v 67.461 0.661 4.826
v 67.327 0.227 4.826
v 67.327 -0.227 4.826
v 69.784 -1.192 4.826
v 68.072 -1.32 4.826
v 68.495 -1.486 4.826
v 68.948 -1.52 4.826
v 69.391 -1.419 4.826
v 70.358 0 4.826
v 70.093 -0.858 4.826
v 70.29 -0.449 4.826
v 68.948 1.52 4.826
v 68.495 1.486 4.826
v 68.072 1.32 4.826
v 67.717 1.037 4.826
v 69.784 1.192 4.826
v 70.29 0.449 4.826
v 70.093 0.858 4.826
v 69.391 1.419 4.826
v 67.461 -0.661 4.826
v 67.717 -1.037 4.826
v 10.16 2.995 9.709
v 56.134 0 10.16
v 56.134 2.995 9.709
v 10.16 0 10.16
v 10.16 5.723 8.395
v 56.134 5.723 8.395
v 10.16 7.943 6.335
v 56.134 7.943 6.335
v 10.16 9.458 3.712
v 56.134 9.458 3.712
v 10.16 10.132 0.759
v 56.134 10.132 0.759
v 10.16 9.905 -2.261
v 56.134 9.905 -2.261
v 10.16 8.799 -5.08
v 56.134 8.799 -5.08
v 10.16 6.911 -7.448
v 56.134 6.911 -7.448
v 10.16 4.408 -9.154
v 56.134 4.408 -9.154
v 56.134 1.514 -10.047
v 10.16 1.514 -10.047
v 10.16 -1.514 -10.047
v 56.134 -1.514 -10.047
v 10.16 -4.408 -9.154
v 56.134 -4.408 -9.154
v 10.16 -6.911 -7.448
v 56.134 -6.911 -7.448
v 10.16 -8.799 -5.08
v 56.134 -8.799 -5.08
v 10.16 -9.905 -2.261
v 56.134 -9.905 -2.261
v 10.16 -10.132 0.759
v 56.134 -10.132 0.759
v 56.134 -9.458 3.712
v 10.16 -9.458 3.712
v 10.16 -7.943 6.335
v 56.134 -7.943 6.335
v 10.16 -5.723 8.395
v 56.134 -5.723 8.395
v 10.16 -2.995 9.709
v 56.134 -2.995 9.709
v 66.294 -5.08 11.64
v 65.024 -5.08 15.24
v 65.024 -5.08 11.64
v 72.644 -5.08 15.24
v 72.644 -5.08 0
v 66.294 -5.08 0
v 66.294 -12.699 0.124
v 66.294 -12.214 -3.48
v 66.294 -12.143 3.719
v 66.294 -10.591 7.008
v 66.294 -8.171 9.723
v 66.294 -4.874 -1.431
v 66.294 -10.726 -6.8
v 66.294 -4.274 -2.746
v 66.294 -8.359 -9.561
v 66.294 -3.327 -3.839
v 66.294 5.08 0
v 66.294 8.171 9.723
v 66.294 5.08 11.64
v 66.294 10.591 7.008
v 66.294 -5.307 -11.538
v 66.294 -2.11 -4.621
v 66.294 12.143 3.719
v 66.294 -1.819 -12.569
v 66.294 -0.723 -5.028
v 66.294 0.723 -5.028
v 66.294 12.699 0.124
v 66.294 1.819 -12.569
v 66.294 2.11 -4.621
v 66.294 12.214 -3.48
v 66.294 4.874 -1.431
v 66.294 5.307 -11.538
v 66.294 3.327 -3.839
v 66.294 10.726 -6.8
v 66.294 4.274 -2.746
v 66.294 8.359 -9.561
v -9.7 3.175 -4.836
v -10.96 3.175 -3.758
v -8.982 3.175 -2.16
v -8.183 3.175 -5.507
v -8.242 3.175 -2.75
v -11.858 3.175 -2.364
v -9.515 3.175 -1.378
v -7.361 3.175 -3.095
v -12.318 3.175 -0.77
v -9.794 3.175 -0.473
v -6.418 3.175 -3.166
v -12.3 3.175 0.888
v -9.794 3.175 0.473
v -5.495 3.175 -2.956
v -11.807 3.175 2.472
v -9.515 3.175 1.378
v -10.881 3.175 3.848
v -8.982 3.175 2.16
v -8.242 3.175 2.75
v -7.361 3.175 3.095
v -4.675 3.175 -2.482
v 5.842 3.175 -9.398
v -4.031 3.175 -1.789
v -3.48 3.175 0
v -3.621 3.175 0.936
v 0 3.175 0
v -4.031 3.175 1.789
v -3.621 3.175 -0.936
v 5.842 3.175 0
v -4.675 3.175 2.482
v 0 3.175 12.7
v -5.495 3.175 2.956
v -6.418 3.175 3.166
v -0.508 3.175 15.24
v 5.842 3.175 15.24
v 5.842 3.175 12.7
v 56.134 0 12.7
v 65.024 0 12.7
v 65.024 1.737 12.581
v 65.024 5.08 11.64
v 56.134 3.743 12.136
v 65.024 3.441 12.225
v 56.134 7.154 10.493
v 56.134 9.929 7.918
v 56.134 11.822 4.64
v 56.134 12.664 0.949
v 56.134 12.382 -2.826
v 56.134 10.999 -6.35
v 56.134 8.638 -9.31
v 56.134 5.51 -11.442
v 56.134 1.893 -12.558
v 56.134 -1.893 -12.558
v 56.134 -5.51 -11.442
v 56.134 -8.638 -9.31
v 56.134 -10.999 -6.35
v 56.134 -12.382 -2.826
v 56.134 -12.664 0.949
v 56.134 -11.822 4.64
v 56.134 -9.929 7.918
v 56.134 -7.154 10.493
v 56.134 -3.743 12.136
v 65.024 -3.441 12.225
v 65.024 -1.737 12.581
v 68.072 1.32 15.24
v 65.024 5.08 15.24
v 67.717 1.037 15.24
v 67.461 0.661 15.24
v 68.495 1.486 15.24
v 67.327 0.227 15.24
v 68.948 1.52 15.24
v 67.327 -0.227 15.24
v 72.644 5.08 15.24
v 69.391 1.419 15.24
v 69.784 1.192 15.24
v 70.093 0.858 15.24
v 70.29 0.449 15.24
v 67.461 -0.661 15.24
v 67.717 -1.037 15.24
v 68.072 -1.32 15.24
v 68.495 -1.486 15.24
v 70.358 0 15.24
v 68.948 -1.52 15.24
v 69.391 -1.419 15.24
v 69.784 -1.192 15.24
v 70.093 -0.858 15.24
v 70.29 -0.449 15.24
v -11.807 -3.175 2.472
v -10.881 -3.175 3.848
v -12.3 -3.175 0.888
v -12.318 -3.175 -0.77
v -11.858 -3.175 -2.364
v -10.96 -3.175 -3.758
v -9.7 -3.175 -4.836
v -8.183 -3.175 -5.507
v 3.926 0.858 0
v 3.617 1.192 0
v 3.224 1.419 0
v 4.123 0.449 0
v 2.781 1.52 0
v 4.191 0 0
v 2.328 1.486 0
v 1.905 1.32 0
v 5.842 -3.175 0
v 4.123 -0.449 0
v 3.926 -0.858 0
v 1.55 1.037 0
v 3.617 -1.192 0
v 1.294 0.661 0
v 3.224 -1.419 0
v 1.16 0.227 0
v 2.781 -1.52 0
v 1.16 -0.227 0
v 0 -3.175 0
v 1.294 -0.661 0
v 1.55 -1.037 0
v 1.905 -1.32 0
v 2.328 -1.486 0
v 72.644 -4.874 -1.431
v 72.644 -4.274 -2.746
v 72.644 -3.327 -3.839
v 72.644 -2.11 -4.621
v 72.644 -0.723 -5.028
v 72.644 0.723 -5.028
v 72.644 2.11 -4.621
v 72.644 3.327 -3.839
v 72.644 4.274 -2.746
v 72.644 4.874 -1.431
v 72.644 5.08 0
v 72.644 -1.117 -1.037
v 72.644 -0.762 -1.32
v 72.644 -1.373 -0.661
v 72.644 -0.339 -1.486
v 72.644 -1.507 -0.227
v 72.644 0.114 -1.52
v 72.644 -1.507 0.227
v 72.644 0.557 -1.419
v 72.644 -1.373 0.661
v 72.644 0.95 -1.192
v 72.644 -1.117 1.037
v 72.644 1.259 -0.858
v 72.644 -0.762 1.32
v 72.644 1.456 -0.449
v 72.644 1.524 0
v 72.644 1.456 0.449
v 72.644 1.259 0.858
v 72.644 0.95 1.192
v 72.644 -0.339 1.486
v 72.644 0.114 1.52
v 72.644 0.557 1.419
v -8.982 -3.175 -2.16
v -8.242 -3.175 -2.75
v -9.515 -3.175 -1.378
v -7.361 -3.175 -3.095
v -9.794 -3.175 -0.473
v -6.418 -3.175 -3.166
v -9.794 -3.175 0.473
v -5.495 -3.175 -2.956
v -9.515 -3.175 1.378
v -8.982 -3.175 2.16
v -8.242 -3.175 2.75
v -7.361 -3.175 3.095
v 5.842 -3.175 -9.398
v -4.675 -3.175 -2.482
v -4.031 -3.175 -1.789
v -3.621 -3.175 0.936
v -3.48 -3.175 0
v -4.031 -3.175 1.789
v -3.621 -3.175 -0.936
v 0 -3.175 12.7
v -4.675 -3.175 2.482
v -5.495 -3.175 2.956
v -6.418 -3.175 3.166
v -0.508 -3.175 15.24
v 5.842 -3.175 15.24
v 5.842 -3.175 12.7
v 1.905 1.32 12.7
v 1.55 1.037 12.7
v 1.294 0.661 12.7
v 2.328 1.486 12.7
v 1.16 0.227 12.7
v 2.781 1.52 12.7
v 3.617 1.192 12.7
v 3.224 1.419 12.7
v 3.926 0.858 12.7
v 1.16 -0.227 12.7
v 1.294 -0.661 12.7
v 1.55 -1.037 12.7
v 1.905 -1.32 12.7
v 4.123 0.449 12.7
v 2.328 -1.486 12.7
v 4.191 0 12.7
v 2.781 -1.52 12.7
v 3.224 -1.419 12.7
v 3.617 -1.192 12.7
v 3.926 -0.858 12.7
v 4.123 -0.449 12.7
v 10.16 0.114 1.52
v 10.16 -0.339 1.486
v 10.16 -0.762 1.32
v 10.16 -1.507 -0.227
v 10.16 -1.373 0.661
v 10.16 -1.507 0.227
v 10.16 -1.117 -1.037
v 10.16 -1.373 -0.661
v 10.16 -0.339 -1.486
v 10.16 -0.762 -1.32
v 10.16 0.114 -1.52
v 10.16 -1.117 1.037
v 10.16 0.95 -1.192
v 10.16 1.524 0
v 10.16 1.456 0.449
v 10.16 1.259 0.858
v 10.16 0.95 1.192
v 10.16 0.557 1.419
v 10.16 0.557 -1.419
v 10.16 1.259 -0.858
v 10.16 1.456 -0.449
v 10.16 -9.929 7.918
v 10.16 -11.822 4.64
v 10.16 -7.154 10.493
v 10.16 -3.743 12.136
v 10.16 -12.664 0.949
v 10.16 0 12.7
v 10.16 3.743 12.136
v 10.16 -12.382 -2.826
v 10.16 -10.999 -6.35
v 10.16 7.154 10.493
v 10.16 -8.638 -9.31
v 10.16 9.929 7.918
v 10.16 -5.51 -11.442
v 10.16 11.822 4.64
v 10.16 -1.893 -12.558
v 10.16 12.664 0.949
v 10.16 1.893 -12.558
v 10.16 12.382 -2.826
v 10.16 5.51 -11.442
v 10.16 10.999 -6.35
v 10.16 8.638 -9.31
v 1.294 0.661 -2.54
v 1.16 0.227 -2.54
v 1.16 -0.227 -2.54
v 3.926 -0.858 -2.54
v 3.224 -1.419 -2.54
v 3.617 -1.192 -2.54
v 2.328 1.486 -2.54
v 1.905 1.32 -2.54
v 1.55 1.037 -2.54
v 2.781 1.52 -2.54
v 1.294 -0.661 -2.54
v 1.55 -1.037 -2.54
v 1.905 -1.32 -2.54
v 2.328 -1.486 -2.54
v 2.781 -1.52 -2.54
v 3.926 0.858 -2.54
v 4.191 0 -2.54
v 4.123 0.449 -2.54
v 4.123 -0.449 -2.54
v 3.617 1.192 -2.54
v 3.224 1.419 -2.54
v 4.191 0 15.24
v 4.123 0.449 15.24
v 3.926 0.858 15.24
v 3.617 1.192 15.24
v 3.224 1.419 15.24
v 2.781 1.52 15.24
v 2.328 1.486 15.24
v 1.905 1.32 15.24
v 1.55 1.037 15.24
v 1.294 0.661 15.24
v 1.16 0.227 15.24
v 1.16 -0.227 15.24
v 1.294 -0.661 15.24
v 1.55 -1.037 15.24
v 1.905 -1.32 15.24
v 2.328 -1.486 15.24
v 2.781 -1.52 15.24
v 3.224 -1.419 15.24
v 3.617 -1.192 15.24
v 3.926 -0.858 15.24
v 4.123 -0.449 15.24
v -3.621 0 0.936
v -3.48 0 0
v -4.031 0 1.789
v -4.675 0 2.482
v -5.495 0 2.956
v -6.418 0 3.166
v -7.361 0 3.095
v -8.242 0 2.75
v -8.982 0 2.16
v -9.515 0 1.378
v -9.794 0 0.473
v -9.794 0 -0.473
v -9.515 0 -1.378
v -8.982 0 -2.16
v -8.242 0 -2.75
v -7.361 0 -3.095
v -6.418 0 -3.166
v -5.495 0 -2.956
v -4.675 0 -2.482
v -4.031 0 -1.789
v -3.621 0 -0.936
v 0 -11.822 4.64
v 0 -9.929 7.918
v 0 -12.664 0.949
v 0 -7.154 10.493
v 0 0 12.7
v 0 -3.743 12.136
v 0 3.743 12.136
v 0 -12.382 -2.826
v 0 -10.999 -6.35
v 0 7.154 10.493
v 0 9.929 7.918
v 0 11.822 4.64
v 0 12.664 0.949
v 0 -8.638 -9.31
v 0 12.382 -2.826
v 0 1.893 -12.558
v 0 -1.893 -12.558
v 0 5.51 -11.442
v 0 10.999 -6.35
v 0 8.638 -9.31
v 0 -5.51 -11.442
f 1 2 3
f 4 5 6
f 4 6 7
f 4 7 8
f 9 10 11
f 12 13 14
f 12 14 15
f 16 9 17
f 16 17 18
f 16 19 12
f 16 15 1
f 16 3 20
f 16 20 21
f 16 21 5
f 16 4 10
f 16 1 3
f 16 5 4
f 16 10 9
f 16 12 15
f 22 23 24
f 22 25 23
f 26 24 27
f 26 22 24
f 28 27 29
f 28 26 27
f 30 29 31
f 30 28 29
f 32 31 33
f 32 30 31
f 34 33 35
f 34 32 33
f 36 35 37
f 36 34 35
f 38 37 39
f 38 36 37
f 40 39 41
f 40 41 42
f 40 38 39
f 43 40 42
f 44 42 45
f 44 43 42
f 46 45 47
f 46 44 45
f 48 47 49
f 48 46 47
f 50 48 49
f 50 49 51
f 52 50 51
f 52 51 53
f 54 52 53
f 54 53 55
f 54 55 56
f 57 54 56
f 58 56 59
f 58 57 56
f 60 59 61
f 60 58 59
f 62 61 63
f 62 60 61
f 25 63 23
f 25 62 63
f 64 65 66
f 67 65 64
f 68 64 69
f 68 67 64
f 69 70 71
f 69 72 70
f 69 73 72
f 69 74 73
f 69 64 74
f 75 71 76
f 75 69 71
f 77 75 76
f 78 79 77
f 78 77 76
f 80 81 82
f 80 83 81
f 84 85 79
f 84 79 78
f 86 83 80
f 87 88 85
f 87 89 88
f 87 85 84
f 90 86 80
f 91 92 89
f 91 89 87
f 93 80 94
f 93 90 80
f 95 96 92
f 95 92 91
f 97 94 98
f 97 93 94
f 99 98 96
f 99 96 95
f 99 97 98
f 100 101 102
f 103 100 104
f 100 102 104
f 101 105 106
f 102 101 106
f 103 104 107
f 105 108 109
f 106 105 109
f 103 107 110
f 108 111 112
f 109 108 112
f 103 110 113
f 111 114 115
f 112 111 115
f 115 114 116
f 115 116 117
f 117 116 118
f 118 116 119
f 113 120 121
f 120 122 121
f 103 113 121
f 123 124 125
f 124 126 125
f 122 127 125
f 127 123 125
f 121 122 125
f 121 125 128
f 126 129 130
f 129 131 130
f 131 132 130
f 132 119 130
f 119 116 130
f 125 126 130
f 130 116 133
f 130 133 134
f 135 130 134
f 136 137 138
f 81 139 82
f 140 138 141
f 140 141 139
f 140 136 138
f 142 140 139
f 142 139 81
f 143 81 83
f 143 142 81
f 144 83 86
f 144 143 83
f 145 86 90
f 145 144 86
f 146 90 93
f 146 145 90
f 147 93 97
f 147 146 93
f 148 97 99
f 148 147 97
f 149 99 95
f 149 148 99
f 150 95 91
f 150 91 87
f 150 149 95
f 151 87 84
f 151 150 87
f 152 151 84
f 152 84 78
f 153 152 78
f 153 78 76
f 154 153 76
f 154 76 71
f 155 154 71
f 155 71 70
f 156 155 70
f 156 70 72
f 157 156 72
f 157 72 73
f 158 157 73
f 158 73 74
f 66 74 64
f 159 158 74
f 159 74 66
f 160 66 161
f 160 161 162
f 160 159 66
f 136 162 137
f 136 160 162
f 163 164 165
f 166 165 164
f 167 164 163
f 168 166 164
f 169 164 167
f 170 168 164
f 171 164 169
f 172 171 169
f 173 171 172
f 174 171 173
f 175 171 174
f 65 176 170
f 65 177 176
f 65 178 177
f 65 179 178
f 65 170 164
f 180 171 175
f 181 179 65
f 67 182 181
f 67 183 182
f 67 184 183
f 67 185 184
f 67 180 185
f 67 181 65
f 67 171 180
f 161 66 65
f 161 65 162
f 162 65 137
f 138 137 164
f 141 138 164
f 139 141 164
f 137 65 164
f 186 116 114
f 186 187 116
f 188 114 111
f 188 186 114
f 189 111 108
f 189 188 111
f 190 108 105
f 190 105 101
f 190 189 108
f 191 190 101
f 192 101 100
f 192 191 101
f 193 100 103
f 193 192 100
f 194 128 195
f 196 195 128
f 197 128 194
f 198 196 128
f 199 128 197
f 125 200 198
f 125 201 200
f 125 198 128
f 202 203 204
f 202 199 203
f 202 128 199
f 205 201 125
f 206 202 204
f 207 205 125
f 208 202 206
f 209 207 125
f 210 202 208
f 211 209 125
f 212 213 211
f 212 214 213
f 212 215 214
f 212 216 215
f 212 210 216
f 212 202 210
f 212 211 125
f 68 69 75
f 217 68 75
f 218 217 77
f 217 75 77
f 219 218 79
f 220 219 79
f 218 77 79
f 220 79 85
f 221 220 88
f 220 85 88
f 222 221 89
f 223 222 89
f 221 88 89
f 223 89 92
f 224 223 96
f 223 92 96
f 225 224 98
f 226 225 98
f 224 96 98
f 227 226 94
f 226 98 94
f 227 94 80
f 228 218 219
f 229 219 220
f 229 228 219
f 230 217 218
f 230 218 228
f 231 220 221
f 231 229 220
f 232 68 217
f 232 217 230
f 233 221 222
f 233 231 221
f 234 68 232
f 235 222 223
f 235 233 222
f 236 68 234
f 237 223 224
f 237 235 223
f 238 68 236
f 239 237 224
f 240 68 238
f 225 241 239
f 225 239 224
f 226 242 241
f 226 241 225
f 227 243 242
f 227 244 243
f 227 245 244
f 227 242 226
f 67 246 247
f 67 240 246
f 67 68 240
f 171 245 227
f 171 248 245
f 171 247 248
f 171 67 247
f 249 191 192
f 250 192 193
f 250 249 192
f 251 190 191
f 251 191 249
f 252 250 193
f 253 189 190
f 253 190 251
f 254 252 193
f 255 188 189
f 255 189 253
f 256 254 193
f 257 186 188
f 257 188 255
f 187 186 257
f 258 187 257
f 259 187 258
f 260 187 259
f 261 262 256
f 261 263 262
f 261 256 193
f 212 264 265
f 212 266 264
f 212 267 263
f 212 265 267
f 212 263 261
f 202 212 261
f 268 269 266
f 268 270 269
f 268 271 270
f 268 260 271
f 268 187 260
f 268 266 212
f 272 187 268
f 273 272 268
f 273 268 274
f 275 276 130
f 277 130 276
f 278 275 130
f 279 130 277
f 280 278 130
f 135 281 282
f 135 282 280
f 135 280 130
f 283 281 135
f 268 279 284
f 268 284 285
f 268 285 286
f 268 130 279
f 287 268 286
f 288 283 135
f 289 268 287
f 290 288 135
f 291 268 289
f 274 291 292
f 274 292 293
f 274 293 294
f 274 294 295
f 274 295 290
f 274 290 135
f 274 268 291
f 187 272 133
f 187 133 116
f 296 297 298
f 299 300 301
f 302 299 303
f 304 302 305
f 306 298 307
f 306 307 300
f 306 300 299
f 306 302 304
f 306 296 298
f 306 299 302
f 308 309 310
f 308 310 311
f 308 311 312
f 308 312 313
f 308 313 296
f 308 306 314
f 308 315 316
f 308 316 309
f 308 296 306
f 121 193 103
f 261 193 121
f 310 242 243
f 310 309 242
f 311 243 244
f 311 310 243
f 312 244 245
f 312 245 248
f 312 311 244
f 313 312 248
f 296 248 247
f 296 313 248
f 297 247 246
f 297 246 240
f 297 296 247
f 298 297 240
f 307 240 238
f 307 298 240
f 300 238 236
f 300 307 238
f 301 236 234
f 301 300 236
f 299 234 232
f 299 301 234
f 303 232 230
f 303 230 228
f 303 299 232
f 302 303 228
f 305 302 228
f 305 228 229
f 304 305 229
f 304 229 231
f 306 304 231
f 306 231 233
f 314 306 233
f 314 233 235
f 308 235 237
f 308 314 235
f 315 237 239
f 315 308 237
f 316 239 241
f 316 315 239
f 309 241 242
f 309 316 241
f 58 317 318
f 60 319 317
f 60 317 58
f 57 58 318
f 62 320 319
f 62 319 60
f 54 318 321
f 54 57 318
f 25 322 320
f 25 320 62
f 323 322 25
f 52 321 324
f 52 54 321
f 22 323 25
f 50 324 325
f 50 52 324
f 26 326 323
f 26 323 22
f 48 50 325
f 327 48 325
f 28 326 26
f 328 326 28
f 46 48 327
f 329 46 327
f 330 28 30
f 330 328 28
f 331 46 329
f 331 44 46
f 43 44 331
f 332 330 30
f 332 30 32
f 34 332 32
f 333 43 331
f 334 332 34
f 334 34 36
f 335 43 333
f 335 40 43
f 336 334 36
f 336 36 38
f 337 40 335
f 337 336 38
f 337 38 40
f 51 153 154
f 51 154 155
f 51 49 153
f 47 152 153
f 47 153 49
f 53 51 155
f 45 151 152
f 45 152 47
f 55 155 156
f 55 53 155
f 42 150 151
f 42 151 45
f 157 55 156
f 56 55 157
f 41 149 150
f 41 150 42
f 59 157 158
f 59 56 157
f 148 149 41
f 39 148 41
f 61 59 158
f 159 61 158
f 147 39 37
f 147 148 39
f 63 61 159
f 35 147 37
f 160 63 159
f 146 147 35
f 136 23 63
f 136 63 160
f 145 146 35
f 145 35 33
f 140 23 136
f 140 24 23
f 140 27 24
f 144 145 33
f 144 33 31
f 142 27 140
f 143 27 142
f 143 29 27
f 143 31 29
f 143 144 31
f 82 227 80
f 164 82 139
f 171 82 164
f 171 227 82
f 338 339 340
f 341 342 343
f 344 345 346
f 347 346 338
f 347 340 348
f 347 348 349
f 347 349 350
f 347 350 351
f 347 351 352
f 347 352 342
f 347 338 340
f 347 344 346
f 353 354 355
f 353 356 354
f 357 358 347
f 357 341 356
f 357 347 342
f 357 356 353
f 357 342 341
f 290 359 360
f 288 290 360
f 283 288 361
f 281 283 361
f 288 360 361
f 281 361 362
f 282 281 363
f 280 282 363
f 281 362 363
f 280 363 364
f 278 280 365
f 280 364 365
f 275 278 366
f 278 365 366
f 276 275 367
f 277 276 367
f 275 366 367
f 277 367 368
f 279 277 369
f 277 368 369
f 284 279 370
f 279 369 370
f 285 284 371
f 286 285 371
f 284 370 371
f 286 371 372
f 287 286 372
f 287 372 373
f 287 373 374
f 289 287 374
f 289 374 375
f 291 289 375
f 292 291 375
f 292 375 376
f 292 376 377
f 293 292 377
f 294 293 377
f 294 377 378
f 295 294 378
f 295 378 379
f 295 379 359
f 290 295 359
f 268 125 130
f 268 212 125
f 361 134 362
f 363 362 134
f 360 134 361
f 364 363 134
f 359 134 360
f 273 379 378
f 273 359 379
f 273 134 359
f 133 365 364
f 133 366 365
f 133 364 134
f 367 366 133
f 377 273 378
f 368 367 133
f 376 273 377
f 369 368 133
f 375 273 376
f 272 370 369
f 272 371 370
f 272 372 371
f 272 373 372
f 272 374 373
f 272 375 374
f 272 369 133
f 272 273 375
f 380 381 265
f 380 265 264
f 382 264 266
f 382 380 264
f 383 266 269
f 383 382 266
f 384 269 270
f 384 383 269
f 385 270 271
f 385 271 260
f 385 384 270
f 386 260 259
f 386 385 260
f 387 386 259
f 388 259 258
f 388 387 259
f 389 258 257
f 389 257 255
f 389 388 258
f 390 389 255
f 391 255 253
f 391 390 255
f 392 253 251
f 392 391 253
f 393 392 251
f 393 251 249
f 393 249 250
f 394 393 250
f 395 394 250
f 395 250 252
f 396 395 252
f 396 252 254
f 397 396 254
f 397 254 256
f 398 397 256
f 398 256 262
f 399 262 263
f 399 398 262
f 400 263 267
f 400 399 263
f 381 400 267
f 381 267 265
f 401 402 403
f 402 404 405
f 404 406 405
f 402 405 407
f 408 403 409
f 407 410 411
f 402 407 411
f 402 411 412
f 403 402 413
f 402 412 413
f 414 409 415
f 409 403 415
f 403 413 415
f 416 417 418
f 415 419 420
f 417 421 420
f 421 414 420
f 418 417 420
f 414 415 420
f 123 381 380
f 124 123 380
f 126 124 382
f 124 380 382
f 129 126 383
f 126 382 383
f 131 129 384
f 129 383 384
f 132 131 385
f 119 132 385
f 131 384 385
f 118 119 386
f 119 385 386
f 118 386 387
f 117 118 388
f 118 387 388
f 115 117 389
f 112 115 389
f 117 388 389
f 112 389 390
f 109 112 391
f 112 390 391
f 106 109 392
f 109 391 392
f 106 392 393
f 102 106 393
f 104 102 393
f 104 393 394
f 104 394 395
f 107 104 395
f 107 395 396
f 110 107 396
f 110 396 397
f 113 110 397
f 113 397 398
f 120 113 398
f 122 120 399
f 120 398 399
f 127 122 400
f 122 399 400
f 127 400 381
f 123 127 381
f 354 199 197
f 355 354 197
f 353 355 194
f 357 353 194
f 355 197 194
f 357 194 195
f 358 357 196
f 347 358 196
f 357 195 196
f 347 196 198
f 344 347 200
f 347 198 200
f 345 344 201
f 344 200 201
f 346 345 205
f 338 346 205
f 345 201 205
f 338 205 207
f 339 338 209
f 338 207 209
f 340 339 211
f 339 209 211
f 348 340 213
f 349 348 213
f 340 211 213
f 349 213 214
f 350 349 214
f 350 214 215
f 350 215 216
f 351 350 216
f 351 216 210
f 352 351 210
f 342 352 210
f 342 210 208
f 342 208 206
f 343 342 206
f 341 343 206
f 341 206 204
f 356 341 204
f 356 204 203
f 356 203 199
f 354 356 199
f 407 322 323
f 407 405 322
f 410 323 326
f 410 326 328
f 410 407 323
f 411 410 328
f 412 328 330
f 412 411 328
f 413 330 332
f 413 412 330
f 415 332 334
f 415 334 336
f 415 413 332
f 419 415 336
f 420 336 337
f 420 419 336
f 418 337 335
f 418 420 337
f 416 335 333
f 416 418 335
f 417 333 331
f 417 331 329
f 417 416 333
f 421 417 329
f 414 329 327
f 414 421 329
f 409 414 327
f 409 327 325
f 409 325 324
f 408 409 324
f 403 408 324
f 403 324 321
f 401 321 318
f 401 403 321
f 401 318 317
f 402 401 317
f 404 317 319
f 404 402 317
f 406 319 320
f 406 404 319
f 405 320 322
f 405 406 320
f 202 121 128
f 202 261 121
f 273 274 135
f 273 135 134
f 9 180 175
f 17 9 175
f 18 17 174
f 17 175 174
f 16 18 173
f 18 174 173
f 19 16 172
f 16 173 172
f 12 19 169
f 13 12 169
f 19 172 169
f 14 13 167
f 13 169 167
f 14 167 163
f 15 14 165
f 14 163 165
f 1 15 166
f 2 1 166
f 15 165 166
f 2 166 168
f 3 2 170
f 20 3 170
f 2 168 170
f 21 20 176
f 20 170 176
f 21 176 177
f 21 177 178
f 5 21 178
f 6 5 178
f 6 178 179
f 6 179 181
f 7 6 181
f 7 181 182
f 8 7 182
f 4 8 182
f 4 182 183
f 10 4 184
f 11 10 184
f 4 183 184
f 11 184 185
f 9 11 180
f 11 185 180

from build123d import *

# Parameters (mm, degrees)
F0_W          = 5.842
F0_H          = 12.7
F2_DEPTH      = 3.175
F2_DEPTH_BACK = 3.175
F0_R          = 3.175
F3_DEPTH      = 3.175
F3_DEPTH_BACK = 3.175
F4_R          = 1.524
F5_DEPTH      = 6.35
F5_DEPTH_BACK = 1.27
F6_DEPTH      = 56.134
F7_R          = 1.524
F8_DEPTH      = 17.78
F9_R          = 1.524
F10_DEPTH     = 10.414


with BuildPart() as f1:
    # F0 (on Front) → F1 (revolve)
    with BuildSketch(Plane.XZ):
        with Locations((2.921, 6.35)):
            Rectangle(F0_W, F0_H)
        Polygon((5.842, 12.7), (5.842, 0), (66.294, 0), (66.294, 12.7), (56.134, 12.7), (56.134, 10.16), (10.16, 10.16), (10.16, 12.7), align=None)
    revolve(axis=Axis((-3.3274, 0, 0), (-1, 0, 0)))

    # F4 (on face) → F5 (join, two sides)
    with BuildSketch(Plane.YZ.offset(66.294)) as f5_sk:
        with BuildLine():
            ThreePointArc((-5.08, 0), (0, -5.08), (5.08, 0))
            ThreePointArc((5.08, 0), (0, 5.08), (-5.08, 0))
        make_face()
        Circle(F4_R, mode=Mode.SUBTRACT)
        with BuildLine():
            ThreePointArc((-5.08, 0), (0, 5.08), (5.08, 0))
            Line((5.08, 0), (5.08, 15.24))
            Line((5.08, 15.24), (-5.08, 15.24))
            Line((-5.08, 15.24), (-5.08, 0))
        make_face()
    extrude(amount=F5_DEPTH)
    extrude(f5_sk.sketch, amount=-F5_DEPTH_BACK)

    # F6 (cut, through all): a face of the model
    f6_faces = [f1.faces().sort_by_distance(p)[0] for p in [
        (66.294, 0, 0),
    ]]
    extrude(f6_faces, amount=-F6_DEPTH, mode=Mode.SUBTRACT)

    # F9 (on face) → F10 (cut)
    with BuildSketch(Plane.XY.offset(15.24)):
        with Locations((68.834, 0)):
            Circle(F9_R)
    extrude(amount=-F10_DEPTH, mode=Mode.SUBTRACT)


with BuildPart() as f2:
    # F0 (on Front) → F2 (new body, two sides)
    with BuildSketch(Plane.XZ) as f2_sk:
        with BuildLine():
            Line((-0.9398, 0), (0, 0))
            Line((0, 0), (0, 12.7))
            Line((0, 12.7), (5.842, 12.7))
            Line((5.842, 12.7), (5.842, 15.24))
            Line((5.842, 15.24), (-0.508, 15.24))
            Line((-0.508, 15.24), (-10.8806298187, 3.8475430269))
            ThreePointArc((-10.8806298187, 3.8475430269), (-4.5919612295, 5.3297205562), (-0.9398, 0))
        make_face()
        with BuildLine():
            Line((5.842, 0), (0, 0))
            Line((0, 0), (-0.9398, 0))
            ThreePointArc((-0.9398, 0), (-3.1957909266, -4.5493385486), (-8.1826630726, -5.5069827884))
            Line((-8.1826630726, -5.5069827884), (5.842, -9.398))
            Line((5.842, -9.398), (5.842, 0))
        make_face()
    extrude(amount=F2_DEPTH)
    extrude(f2_sk.sketch, amount=-F2_DEPTH_BACK)

    # F0 (on Front) → F3 (join, two sides)
    with BuildSketch(Plane.XZ) as f3_sk:
        with BuildLine():
            ThreePointArc((-8.1826630726, -5.5069827884), (-3.1957909266, -4.5493385486), (-0.9398, 0))
            ThreePointArc((-0.9398, 0), (-4.5919612295, 5.3297205562), (-10.8806298187, 3.8475430269))
            ThreePointArc((-10.8806298187, 3.8475430269), (-12.1459778134, -1.5837270034), (-8.1826630726, -5.5069827884))
        make_face()
        with Locations((-6.6548, 0)):
            Circle(F0_R, mode=Mode.SUBTRACT)
    extrude(amount=F3_DEPTH)
    extrude(f3_sk.sketch, amount=-F3_DEPTH_BACK)

    # F7 (on face) → F8 (cut)
    with BuildSketch(Plane.XY.offset(15.24)):
        with Locations((2.667, 0)):
            Circle(F7_R)
    extrude(amount=-F8_DEPTH, mode=Mode.SUBTRACT)


solid = Compound([f1.part, f2.part])
